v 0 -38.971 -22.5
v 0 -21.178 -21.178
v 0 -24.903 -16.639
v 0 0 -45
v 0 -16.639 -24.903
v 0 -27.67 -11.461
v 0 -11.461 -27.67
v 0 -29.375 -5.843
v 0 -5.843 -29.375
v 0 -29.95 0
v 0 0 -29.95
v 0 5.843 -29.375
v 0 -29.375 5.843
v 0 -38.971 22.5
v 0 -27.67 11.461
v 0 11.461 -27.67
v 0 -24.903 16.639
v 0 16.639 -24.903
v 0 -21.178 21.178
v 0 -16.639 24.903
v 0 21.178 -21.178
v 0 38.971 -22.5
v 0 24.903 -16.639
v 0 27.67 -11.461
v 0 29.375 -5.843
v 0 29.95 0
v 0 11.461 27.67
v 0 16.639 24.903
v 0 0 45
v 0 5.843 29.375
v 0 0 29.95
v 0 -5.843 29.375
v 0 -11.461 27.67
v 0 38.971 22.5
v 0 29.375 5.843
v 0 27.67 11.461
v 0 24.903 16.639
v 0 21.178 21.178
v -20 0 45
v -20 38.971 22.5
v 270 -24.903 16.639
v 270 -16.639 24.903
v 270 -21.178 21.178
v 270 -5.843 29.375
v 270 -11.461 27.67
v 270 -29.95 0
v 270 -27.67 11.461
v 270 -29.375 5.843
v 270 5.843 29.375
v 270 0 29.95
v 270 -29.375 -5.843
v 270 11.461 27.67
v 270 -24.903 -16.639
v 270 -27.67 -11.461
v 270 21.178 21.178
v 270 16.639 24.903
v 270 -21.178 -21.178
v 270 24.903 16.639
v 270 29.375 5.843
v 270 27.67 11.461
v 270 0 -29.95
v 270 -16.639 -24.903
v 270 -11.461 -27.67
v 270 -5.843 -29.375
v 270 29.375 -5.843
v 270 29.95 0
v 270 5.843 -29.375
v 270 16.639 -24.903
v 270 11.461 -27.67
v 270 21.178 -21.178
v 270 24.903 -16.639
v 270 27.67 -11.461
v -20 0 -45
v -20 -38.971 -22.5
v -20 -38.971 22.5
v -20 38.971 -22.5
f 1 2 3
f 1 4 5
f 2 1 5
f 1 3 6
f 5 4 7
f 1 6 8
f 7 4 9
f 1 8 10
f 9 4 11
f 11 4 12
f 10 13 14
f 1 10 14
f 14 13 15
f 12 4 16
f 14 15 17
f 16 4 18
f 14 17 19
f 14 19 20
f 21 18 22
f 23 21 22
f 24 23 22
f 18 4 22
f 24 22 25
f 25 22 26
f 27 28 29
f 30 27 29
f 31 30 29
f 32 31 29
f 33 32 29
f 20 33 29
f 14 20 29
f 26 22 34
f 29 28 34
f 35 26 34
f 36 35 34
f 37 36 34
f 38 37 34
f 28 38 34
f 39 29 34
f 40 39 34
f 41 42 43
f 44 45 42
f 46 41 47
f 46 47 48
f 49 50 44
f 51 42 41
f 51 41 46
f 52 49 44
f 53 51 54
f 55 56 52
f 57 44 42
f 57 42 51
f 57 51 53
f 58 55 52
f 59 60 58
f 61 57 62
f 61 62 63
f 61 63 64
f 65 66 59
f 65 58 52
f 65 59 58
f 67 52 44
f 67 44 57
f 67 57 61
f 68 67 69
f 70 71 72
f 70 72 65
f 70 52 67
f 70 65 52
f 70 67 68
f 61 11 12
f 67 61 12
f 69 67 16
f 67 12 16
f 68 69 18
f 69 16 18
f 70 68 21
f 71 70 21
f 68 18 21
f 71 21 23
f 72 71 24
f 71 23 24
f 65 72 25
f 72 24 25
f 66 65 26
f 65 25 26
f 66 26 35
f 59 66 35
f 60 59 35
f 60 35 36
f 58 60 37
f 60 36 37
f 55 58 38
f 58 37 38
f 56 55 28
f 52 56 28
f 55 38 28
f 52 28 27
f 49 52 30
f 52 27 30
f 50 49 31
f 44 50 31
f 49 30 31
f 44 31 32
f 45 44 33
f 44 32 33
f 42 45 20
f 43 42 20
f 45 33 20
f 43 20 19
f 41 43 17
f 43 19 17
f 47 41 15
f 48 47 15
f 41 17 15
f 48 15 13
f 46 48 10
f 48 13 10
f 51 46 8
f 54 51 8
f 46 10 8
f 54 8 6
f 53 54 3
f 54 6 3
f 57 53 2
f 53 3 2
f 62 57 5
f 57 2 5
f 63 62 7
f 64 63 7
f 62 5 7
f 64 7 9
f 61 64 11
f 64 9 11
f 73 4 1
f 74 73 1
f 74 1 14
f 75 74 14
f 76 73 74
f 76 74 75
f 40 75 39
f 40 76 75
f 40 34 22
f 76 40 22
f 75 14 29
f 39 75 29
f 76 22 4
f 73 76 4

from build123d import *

# Parameters (mm, degrees)
SKETCH1_R           = 29.95
BOSS_EXTRUDE1_DEPTH = 270
BOSS_EXTRUDE2_DEPTH = 20


with BuildPart() as part:
    # Sketch1 → Boss-Extrude1 (new body)
    with BuildSketch(Plane(origin=(0, 0, 0), x_dir=(0, 0, -1), z_dir=(1, 0, 0))):
        Circle(SKETCH1_R)
    extrude(amount=BOSS_EXTRUDE1_DEPTH)

    # Sketch2 → Boss-Extrude2 (add)
    with BuildSketch(Plane.ZY):
        Polygon((45, 0), (22.5, 38.97114317), (-22.5, 38.97114317), (-45, 0), (-22.5, -38.97114317), (22.5, -38.97114317), align=None)
    extrude(amount=BOSS_EXTRUDE2_DEPTH)


solid = part.part
